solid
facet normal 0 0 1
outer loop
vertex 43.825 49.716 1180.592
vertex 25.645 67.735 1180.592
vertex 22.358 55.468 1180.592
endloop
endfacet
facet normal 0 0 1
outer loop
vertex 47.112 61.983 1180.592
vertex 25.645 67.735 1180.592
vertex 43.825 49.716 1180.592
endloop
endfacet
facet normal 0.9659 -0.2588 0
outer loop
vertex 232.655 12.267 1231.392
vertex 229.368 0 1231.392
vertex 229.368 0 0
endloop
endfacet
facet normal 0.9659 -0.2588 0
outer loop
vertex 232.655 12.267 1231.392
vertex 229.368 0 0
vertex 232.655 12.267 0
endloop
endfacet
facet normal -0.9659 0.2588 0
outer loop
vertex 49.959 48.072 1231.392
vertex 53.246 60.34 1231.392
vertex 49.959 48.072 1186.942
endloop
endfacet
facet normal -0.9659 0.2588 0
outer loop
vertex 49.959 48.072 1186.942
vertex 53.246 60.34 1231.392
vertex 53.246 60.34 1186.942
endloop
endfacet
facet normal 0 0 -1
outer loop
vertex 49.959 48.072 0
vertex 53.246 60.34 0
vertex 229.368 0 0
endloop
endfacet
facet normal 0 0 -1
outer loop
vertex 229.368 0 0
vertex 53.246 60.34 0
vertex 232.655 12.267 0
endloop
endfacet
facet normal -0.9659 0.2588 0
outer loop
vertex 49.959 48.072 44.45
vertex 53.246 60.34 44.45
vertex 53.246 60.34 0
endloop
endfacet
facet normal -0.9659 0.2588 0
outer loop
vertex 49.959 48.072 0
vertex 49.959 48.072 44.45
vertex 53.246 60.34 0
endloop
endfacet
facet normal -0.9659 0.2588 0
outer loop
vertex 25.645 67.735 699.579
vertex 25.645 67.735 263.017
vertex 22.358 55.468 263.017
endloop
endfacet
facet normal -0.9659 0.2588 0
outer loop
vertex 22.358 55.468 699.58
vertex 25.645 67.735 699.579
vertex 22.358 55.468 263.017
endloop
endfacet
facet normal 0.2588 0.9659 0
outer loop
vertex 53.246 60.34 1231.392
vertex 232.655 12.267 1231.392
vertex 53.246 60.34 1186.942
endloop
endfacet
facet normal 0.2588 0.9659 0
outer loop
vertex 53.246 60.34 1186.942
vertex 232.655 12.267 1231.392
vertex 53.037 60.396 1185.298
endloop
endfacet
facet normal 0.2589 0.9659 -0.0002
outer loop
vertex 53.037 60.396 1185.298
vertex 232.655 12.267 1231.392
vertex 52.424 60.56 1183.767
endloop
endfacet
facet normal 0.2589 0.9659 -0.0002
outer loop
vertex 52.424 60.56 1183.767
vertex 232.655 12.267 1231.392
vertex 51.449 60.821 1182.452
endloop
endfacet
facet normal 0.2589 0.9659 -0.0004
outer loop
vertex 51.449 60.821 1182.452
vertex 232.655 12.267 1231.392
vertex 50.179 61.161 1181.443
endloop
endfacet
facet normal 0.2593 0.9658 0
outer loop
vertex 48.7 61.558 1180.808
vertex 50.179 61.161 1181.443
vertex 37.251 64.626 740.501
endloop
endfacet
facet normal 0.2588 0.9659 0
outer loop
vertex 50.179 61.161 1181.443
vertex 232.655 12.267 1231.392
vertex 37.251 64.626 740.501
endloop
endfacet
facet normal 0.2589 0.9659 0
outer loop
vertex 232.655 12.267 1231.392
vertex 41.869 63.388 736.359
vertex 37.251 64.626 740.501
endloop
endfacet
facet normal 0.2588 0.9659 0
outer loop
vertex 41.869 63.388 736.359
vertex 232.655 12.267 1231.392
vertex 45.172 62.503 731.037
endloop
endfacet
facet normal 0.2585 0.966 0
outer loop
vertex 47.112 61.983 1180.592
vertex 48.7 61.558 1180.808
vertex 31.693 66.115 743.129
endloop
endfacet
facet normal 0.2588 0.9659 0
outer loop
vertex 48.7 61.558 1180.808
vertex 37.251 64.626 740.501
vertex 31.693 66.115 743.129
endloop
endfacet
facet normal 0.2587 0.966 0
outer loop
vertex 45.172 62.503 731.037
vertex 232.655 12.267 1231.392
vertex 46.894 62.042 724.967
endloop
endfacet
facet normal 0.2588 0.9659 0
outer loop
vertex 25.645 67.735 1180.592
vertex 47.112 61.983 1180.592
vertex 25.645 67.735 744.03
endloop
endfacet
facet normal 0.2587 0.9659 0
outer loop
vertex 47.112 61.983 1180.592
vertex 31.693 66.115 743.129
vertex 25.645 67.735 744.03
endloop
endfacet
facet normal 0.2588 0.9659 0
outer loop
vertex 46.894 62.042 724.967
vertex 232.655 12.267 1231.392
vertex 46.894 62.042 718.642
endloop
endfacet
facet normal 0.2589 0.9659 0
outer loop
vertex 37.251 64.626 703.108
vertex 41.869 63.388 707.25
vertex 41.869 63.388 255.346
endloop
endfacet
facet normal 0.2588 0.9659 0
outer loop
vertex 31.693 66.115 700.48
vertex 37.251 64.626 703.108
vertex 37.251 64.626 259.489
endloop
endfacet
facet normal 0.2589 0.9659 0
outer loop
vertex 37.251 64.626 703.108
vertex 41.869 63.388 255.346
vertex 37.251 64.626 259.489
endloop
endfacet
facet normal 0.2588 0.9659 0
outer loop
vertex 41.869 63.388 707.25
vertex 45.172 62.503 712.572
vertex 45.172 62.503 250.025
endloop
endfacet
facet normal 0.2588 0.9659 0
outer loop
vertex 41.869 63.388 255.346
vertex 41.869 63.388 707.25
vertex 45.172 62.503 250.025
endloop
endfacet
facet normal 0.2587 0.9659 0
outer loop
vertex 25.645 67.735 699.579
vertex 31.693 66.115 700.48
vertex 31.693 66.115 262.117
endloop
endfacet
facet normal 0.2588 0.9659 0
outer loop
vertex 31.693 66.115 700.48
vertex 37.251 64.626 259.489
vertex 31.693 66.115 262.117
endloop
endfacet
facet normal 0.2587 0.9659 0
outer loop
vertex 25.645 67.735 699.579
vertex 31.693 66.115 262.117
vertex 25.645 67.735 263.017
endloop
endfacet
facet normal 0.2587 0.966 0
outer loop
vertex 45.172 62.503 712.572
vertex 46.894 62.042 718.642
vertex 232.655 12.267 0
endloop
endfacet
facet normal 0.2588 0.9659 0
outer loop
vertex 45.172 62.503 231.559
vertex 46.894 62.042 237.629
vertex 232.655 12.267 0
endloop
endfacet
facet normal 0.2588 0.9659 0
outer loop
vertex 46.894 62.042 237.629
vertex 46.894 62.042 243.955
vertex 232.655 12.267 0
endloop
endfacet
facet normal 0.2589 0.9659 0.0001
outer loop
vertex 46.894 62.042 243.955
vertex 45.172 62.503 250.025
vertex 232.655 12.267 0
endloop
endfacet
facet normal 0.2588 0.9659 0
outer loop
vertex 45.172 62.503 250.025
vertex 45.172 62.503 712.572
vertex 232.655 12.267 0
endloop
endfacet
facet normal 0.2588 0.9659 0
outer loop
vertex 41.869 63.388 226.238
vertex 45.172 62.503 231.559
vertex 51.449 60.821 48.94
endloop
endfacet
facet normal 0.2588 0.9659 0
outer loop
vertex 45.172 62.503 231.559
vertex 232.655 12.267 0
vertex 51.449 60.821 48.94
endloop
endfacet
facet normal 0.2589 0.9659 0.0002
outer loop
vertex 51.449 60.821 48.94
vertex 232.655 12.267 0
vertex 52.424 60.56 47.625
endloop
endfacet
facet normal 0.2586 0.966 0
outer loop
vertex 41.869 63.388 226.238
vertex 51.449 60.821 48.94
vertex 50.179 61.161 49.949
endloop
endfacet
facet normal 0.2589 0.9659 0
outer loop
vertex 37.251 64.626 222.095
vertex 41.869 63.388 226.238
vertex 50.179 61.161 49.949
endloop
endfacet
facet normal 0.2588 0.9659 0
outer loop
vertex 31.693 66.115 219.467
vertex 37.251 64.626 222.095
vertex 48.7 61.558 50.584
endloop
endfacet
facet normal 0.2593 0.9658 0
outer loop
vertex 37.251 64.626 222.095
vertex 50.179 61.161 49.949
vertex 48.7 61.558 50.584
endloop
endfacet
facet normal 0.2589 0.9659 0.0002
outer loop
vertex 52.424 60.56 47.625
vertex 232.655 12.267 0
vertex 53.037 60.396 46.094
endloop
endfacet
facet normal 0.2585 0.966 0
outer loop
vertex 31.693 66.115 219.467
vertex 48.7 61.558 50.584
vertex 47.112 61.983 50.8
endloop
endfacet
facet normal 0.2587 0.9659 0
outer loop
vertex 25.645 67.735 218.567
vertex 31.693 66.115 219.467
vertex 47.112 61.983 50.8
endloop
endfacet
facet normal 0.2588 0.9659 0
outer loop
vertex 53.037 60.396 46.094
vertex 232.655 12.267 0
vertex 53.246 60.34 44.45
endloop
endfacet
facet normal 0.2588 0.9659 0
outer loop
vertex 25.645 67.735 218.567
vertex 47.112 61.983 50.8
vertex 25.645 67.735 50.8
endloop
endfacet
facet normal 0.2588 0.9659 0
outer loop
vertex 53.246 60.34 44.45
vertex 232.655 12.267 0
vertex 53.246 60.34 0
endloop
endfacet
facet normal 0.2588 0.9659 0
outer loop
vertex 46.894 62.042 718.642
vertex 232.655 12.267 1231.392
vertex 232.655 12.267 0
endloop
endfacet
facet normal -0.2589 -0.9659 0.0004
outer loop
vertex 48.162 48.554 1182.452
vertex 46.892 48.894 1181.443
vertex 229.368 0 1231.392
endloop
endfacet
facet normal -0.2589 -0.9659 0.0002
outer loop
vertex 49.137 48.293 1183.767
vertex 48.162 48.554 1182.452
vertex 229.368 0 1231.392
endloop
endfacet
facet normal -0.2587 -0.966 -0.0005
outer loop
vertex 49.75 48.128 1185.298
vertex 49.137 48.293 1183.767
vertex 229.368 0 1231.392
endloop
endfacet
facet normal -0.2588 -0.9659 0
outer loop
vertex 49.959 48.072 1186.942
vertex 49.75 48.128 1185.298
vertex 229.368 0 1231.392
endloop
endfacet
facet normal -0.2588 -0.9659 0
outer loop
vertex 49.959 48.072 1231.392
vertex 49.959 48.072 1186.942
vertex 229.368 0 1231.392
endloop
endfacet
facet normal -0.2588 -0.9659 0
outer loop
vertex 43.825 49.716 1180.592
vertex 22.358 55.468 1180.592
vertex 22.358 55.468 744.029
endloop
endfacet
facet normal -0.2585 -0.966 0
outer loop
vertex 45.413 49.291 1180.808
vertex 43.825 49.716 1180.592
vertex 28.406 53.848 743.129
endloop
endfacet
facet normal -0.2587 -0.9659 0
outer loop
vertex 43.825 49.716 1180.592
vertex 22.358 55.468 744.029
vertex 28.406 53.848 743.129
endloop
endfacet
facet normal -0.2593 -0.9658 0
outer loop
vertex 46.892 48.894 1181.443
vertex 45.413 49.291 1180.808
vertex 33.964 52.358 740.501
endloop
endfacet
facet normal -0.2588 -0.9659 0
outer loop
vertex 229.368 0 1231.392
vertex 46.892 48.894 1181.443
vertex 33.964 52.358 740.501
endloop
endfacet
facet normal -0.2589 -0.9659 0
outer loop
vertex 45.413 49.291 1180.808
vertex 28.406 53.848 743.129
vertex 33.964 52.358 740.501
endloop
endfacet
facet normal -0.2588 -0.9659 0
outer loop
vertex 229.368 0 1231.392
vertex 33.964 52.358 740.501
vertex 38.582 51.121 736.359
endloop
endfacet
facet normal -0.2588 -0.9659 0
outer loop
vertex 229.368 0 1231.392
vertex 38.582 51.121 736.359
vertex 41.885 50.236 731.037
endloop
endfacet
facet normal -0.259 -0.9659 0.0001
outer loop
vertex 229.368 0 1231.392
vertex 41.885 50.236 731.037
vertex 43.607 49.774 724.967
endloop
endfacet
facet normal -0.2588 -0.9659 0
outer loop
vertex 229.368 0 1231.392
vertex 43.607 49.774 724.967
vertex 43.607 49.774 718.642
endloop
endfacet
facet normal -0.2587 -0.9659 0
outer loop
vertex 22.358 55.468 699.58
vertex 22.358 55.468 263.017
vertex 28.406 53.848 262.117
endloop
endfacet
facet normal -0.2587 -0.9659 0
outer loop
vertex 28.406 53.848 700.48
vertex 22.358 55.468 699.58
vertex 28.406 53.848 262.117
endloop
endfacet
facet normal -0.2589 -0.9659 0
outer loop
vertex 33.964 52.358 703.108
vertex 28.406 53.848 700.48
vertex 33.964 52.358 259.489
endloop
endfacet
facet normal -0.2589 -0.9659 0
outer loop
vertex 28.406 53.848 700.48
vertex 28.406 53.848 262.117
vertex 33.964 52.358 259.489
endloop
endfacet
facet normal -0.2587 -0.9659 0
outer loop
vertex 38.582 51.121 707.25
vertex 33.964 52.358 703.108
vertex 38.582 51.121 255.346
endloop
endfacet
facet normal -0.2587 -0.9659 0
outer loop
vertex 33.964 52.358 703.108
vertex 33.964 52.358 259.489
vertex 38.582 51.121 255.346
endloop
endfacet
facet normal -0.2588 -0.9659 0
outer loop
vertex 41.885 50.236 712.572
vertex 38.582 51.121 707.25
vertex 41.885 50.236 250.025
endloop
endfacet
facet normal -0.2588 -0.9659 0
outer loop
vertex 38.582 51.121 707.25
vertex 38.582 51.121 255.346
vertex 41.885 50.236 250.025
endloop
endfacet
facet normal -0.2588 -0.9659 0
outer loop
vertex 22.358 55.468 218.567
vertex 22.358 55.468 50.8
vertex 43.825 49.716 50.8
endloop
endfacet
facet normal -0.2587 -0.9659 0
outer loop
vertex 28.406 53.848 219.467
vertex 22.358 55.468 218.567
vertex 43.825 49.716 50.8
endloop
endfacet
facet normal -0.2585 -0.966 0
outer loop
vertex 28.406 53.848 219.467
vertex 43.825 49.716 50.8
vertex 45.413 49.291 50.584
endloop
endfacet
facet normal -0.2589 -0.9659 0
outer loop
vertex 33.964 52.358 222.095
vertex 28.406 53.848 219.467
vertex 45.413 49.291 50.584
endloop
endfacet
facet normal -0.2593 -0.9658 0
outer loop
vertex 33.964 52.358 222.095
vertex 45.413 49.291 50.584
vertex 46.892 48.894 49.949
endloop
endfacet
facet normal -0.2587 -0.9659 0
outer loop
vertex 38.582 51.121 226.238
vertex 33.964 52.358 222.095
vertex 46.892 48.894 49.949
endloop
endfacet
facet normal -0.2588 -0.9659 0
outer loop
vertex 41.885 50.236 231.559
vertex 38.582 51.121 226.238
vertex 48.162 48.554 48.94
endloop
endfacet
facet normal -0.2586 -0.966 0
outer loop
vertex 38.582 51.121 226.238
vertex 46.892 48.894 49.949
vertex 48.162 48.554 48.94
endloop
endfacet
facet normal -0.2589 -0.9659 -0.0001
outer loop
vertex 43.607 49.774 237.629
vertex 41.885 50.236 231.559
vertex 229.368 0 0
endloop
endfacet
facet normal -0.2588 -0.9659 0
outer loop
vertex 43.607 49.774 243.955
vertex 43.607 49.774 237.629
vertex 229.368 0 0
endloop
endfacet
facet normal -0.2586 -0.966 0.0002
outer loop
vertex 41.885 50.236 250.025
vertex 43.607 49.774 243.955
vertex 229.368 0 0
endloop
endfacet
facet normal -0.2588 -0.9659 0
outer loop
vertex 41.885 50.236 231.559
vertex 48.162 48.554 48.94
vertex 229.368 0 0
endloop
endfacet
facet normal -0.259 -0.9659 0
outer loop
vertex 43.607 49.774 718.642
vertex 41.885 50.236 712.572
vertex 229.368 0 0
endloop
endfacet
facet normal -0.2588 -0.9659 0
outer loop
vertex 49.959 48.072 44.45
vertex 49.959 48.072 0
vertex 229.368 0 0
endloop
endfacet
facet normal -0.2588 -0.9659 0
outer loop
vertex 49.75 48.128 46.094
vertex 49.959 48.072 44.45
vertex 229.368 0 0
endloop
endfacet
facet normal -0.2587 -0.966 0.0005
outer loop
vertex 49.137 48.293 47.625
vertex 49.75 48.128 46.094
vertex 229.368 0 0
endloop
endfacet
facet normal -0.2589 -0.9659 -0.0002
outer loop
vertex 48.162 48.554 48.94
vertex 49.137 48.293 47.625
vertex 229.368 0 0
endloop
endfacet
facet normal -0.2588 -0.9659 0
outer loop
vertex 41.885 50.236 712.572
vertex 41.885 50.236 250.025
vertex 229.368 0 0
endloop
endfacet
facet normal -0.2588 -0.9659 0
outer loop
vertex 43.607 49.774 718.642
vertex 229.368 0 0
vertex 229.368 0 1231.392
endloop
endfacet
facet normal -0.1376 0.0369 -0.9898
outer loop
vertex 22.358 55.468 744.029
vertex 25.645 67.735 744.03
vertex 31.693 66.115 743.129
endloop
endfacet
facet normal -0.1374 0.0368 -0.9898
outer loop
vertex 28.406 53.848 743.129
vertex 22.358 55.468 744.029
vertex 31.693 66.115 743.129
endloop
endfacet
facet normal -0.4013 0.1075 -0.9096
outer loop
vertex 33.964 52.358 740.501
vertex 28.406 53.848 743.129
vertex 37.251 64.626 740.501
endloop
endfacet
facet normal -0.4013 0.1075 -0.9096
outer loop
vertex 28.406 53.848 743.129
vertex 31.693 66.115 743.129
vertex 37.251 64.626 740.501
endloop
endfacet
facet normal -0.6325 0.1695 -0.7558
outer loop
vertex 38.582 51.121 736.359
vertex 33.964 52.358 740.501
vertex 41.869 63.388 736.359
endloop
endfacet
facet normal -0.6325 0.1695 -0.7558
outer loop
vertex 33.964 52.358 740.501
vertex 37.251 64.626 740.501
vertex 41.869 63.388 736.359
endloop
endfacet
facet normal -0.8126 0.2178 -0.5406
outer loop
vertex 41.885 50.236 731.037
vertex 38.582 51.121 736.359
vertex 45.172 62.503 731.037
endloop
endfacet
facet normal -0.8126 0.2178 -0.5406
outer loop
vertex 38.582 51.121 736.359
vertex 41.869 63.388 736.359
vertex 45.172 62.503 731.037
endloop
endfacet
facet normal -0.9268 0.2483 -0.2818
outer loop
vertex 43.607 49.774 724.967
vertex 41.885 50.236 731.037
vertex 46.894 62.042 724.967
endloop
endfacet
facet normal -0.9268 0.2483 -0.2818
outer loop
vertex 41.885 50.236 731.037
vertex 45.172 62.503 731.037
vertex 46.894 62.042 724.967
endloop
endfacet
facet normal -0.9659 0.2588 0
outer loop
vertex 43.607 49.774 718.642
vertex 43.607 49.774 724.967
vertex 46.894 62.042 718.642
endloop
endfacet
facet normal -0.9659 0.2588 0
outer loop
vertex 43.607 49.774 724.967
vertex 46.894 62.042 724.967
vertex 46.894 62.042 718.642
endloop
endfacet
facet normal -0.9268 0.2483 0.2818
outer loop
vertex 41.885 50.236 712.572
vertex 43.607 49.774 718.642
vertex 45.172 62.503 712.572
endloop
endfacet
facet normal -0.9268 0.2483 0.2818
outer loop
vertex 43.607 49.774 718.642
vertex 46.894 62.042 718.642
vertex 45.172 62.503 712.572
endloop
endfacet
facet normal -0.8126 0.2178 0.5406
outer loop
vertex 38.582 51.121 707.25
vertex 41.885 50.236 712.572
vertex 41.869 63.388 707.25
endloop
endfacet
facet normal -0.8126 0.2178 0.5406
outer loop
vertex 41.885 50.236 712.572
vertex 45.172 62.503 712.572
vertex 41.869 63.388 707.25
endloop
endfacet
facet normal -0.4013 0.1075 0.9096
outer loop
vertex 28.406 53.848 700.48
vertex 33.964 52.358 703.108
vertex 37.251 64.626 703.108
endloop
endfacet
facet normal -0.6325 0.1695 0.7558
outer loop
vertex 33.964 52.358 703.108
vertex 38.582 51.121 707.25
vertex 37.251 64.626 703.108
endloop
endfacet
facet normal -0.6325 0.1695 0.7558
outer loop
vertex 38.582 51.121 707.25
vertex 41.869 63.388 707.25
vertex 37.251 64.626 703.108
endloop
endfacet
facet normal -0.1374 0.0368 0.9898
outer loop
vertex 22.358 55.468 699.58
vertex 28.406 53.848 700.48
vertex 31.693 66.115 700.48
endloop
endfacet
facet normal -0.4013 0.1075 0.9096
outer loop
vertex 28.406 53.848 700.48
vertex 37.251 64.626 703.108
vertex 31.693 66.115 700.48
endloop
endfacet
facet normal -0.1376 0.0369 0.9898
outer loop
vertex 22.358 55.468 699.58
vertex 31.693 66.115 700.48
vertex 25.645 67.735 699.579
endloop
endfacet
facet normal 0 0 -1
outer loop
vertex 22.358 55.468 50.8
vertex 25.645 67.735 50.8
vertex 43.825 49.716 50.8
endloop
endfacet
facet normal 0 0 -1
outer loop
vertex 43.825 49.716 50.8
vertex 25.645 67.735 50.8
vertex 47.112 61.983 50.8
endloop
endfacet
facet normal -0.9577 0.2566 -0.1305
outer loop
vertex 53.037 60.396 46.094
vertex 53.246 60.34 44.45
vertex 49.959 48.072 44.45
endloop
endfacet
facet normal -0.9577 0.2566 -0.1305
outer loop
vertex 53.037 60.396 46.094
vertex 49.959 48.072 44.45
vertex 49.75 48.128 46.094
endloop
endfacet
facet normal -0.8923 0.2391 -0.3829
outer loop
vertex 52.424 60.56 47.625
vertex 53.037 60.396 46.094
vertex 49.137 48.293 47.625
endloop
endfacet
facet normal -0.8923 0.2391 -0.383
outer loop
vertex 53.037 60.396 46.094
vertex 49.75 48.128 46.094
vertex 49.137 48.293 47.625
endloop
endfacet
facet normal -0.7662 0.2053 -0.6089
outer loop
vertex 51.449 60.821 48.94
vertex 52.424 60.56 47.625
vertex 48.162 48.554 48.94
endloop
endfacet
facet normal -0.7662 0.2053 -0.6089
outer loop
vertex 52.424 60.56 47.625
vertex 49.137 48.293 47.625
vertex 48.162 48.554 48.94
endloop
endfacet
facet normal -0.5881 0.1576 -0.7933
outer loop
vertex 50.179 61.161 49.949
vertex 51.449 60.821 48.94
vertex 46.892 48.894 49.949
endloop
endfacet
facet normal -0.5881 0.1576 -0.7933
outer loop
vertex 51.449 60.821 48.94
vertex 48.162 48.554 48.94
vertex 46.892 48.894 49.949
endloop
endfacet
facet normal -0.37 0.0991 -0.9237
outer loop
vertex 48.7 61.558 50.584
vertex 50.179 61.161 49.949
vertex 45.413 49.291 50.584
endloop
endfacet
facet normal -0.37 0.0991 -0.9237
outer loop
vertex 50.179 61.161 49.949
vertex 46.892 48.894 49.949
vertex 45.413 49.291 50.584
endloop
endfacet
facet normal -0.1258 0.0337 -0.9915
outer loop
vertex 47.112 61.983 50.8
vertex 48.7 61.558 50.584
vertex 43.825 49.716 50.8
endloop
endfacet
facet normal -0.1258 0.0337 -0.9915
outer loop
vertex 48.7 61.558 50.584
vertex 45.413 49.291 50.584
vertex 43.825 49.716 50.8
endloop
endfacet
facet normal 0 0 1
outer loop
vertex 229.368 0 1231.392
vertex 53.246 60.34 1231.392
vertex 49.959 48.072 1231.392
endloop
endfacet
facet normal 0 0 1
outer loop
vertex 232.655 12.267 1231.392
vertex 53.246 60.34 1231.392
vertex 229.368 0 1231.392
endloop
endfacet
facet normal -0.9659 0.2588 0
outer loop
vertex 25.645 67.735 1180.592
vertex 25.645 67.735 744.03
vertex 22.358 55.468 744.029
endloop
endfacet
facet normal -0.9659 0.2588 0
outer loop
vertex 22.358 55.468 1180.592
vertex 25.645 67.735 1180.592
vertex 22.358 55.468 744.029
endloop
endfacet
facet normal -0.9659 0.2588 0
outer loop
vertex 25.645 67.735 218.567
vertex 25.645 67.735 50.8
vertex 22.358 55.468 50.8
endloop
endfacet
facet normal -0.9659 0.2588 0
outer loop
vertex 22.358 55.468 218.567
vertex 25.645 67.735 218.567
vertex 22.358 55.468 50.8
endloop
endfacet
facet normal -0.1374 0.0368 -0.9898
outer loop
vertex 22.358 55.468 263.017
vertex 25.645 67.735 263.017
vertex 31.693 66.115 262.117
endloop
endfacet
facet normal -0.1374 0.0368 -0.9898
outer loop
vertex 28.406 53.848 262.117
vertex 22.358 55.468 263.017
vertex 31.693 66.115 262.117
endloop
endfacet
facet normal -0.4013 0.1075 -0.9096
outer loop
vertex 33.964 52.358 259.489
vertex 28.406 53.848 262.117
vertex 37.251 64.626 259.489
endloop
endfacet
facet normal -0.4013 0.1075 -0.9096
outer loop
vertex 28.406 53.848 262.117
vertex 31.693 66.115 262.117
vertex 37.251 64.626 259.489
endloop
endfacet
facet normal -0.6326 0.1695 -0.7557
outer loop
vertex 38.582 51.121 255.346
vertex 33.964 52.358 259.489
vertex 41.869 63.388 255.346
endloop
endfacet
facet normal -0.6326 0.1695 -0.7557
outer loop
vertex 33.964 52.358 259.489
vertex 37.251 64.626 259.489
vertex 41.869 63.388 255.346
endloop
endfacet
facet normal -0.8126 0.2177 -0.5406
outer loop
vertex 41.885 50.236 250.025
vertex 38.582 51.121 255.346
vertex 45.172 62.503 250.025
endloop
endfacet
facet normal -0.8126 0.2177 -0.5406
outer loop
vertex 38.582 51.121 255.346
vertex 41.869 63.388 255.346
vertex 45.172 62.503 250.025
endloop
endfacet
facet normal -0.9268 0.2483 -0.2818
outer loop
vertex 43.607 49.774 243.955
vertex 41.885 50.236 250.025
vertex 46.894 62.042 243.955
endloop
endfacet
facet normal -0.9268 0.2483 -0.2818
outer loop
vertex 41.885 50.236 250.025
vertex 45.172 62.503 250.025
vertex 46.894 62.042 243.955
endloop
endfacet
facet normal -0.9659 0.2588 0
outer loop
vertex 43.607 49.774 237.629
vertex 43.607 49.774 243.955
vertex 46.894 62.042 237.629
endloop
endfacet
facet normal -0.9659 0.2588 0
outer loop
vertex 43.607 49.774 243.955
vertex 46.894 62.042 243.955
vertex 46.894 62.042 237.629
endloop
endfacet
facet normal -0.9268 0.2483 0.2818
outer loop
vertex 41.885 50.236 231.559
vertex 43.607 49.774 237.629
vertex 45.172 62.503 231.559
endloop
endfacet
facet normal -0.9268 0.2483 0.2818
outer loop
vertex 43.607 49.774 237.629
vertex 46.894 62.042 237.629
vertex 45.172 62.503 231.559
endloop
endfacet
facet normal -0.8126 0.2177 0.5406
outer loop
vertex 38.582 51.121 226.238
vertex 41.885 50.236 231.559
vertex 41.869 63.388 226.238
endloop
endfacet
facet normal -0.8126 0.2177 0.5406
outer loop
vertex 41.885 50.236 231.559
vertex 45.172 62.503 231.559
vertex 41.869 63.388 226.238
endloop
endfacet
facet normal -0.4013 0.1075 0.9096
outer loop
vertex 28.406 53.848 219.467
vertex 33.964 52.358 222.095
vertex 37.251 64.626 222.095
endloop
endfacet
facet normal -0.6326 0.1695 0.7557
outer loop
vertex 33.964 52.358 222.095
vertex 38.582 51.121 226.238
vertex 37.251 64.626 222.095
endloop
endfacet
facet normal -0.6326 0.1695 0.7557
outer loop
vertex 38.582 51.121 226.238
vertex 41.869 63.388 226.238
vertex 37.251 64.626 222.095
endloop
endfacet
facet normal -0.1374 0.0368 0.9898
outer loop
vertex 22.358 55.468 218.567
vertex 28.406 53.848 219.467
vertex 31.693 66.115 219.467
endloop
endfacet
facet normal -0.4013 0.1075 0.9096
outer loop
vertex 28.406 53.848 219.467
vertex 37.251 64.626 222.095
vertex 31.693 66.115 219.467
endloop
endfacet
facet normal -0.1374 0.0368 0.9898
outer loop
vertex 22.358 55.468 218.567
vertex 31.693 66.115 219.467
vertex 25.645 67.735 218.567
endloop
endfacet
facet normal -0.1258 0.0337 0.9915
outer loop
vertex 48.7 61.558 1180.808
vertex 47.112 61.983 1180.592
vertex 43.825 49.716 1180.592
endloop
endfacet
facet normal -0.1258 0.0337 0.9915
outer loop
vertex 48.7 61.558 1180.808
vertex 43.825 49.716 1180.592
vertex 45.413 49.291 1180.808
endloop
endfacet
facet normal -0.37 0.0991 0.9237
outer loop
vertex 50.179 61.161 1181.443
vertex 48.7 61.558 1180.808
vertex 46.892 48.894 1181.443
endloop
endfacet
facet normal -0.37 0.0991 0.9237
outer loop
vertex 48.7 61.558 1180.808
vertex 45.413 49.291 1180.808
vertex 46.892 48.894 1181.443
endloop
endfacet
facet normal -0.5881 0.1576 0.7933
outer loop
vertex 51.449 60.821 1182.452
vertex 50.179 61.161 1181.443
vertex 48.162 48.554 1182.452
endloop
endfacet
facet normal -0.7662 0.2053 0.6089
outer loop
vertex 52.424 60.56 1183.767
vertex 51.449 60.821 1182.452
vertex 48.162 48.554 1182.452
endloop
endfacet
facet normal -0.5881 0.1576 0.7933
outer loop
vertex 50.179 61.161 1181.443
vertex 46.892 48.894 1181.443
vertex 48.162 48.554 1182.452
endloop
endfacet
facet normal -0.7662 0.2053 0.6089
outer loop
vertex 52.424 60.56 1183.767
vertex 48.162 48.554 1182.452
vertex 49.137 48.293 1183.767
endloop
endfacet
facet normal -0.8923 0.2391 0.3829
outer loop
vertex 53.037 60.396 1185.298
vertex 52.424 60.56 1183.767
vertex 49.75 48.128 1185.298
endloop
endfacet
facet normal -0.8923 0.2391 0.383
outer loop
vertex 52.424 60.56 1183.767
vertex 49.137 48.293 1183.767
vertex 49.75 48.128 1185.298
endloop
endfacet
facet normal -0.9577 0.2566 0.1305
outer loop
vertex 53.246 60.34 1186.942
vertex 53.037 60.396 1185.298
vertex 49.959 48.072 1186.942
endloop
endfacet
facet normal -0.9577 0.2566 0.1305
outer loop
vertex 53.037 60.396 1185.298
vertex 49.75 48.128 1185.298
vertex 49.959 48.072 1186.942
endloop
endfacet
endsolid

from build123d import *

# Parameters (mm, degrees)
BOSS_EXTRUDE1_DEPTH = 1231.392
SKETCH5_R           = 22.225
SKETCH5_W           = 28.575
SKETCH5_H           = 50.8
CUT_EXTRUDE2_DEPTH  = 1252.786284181
FILLET1_R           = 6.35


with BuildPart() as part:
    # Sketch1 → Boss-Extrude1 (new body)
    with BuildSketch(Plane.XY):
        Polygon((232.654542571, 12.267259413), (25.64456355, 67.73541462), (22.35756176, 55.468156604), (229.367540781, 1.397e-06), align=None)
    extrude(amount=BOSS_EXTRUDE1_DEPTH)

    # Sketch5 → Cut-Extrude2 (cut, through all)
    with BuildSketch(Plane(origin=(18.651713196, 69.609143174, 0), x_dir=(0.9659258280351158, -0.25881903858618227, 0), z_dir=(0.2588190385861823, 0.965925828035116, 0))):
        with Locations((7.239531392, -721.8045)):
            Circle(SKETCH5_R)
        with Locations((7.239531392, -240.792)):
            Circle(SKETCH5_R)
        with Locations((21.527031392, -1205.992)):
            Rectangle(SKETCH5_W, SKETCH5_H)
        with Locations((21.527031392, -25.4)):
            Rectangle(SKETCH5_W, SKETCH5_H)
    extrude(amount=-CUT_EXTRUDE2_DEPTH, mode=Mode.SUBTRACT)

    # Fillet1
    fillet1_edges = [part.edges().sort_by_distance(p)[0] for p in [
        (51.602393192, 54.206031584, 1180.592),
        (51.602393192, 54.206031584, 50.8),
    ]]
    fillet(fillet1_edges, radius=FILLET1_R)


solid = part.part
